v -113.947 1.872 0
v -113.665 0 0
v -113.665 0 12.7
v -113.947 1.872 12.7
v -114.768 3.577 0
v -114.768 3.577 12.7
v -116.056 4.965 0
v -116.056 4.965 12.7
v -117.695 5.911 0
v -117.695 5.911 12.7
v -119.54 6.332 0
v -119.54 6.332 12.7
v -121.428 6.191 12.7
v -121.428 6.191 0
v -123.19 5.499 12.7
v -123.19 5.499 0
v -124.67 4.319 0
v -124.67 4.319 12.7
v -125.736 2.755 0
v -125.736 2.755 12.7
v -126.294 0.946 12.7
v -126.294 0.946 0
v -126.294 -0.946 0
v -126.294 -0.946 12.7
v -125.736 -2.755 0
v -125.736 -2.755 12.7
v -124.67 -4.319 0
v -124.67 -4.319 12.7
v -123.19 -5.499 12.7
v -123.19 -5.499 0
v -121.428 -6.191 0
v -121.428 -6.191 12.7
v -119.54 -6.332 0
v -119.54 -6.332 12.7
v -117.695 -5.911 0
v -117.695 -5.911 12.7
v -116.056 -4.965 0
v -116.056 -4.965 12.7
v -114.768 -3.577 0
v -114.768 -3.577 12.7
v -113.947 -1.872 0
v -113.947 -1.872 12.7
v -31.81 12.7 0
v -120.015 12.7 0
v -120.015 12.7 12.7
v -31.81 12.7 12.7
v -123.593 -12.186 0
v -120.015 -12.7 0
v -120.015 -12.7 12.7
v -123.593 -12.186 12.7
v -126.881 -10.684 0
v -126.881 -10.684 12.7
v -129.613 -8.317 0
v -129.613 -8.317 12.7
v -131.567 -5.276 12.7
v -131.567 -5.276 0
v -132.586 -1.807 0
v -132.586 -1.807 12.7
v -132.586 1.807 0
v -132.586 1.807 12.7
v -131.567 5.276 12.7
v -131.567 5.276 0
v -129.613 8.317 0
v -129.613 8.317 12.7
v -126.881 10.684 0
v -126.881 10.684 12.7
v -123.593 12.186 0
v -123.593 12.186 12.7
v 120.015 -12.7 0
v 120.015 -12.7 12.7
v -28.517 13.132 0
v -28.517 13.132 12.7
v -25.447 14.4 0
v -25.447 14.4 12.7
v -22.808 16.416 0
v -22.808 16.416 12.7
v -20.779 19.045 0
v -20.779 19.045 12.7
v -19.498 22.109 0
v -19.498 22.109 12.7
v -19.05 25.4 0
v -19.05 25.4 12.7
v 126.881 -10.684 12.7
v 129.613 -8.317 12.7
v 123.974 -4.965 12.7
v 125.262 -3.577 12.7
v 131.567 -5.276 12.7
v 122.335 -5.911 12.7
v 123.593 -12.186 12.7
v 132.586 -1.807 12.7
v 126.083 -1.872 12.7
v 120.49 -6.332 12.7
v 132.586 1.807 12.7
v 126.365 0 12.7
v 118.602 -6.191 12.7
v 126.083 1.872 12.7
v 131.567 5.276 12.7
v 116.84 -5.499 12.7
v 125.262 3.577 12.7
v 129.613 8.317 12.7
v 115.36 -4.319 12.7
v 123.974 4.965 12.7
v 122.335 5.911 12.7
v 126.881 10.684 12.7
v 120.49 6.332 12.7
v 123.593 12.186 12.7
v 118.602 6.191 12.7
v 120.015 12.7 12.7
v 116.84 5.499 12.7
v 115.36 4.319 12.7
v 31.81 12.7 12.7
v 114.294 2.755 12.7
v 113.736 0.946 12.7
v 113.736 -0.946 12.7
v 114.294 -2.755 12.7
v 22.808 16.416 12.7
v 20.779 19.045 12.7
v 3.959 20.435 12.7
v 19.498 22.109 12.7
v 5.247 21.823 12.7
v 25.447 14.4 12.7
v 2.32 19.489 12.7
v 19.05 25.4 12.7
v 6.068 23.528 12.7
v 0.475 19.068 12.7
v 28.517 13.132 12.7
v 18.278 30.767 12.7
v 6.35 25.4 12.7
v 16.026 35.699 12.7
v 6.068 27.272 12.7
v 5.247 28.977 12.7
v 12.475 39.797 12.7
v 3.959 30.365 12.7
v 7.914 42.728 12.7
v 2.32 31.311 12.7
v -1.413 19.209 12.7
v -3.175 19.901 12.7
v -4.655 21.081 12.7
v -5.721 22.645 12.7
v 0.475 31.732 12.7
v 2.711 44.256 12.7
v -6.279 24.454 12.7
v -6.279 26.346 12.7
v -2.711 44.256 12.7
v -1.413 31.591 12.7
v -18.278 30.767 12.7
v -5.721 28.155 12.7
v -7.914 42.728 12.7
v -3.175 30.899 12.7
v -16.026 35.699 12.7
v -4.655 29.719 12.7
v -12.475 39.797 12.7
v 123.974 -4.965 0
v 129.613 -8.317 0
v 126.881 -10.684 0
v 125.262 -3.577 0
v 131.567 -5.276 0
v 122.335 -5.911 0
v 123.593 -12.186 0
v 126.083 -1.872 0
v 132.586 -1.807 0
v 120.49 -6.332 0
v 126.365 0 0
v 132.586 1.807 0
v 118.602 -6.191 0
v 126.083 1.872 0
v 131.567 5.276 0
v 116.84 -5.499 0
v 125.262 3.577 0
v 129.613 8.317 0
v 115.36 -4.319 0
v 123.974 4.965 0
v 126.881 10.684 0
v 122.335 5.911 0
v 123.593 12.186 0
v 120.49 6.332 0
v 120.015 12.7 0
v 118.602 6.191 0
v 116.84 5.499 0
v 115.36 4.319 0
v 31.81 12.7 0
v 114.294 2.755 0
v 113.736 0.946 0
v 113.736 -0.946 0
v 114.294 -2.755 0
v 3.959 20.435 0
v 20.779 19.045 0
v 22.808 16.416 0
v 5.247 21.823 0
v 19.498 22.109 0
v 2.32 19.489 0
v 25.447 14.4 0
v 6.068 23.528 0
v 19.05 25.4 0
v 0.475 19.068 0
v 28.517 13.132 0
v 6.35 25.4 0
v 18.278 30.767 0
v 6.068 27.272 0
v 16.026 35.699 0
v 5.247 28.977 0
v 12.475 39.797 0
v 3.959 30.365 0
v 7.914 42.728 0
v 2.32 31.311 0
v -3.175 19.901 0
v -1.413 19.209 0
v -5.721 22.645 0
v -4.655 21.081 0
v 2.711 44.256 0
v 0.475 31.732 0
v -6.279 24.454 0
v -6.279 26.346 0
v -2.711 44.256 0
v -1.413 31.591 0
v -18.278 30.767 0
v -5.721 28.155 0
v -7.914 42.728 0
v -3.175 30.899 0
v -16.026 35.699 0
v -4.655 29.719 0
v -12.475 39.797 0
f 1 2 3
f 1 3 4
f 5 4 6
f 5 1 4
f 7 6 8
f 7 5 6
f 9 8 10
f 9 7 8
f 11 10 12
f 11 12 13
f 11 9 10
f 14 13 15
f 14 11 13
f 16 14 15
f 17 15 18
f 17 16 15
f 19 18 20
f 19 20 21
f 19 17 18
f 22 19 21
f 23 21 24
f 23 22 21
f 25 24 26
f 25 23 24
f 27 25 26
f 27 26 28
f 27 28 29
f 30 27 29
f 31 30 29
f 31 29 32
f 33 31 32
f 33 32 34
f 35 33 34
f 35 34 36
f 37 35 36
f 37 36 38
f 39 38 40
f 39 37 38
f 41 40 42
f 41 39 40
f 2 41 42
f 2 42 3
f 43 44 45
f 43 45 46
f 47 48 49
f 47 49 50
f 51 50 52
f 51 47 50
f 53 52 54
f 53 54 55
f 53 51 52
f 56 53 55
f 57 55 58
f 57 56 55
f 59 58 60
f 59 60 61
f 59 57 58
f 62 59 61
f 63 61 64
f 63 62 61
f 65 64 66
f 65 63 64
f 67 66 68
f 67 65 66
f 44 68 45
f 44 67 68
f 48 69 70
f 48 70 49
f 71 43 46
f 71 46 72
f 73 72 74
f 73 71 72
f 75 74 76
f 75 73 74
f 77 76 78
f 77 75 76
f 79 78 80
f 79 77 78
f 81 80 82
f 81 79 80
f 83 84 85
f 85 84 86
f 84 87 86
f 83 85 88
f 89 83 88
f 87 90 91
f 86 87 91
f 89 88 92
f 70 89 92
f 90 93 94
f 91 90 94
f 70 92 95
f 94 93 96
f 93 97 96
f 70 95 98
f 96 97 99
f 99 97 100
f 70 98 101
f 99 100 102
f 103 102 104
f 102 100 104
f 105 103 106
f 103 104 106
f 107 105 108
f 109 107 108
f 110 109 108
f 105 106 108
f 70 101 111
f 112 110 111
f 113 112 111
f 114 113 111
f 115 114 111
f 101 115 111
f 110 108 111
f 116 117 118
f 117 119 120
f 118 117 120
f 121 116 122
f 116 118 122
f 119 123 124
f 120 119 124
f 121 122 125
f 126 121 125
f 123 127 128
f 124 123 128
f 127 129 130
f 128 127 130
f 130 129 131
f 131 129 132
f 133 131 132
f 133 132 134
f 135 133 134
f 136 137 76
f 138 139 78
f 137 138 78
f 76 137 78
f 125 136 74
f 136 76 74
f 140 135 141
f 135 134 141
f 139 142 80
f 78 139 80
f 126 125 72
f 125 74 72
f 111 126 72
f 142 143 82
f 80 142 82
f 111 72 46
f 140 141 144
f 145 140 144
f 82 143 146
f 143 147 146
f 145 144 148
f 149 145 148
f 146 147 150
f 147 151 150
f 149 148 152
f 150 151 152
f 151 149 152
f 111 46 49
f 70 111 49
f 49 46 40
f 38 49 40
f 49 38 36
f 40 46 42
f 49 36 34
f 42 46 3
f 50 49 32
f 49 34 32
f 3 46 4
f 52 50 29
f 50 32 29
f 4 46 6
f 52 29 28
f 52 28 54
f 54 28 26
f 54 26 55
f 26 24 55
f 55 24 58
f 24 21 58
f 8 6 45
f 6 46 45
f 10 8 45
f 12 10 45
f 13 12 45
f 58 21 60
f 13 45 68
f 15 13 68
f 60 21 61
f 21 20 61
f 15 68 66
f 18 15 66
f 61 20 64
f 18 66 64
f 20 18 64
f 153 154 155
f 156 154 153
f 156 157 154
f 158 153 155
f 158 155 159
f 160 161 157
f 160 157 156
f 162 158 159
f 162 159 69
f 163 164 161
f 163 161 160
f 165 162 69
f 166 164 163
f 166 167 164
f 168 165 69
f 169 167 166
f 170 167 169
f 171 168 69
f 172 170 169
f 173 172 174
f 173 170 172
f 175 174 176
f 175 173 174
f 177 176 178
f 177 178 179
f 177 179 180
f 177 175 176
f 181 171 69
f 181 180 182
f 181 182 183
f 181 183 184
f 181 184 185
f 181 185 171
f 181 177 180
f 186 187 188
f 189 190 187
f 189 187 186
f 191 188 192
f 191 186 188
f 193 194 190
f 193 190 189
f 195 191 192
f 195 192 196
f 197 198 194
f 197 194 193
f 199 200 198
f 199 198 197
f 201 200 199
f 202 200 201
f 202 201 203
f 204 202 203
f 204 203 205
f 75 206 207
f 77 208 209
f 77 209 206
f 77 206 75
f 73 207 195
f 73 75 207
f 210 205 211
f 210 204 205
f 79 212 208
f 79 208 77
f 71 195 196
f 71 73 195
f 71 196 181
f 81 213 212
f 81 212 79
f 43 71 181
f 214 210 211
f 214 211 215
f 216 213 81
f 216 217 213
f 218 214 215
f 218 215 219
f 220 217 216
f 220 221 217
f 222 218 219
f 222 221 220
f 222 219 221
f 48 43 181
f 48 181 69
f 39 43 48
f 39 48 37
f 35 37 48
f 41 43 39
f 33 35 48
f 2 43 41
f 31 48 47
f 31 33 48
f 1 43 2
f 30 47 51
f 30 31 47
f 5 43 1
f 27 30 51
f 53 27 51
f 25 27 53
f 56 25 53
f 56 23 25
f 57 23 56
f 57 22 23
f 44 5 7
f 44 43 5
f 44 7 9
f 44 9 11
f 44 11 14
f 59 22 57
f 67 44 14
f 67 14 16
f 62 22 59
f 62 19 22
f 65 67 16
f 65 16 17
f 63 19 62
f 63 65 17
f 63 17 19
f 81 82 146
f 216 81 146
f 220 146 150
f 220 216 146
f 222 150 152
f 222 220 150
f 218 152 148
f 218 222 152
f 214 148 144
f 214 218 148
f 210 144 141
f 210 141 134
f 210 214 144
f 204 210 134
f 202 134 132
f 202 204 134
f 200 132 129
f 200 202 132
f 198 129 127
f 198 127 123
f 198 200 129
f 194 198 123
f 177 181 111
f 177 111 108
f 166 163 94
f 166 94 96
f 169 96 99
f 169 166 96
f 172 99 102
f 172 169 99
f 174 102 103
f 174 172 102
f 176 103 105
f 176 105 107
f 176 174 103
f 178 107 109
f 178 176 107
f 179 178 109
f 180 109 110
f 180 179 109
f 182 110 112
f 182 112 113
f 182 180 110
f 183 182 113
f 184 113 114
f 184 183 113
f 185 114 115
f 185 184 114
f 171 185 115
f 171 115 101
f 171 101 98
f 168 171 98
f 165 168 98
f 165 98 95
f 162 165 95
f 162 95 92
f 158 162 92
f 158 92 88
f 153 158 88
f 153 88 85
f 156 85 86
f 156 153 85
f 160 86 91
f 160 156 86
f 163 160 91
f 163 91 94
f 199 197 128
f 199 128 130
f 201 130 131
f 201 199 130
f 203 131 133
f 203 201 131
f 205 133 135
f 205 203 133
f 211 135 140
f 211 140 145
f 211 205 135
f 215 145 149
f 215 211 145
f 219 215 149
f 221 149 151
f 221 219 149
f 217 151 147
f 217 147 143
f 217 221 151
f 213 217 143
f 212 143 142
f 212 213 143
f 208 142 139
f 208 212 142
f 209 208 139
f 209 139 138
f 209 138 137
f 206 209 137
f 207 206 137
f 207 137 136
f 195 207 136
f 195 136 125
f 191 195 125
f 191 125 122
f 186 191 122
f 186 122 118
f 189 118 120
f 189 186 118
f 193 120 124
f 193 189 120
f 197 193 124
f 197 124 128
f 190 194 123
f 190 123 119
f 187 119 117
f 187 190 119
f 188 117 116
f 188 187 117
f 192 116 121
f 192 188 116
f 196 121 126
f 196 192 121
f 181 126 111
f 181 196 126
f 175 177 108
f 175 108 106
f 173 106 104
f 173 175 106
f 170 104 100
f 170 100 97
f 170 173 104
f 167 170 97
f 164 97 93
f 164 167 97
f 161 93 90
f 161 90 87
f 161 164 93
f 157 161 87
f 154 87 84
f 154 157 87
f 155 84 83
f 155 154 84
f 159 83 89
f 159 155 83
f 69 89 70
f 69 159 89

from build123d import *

# Parameters (mm, degrees)
SKETCH1_R           = 6.35
BOSS_EXTRUDE1_DEPTH = 12.7


with BuildPart() as part:
    # Sketch1 → Boss-Extrude1 (new body)
    with BuildSketch(Plane.XY):
        with BuildLine():
            Line((-120.015, 12.7), (-31.809733165, 12.7))
            ThreePointArc((-31.809733165, 12.7), (-22.808332465, 16.416135762), (-19.05, 25.4))
            ThreePointArc((-19.05, 25.4), (0, 44.45), (19.05, 25.4))
            ThreePointArc((19.05, 25.4), (22.808332465, 16.416135762), (31.809733165, 12.7))
            Line((31.809733165, 12.7), (120.015, 12.7))
            ThreePointArc((120.015, 12.7), (132.715, 0), (120.015, -12.7))
            Line((120.015, -12.7), (-120.015, -12.7))
            ThreePointArc((-120.015, -12.7), (-132.715, 0), (-120.015, 12.7))
        make_face()
        with Locations((-120.015, 0)):
            Circle(SKETCH1_R, mode=Mode.SUBTRACT)
        with Locations((120.015, 0)):
            Circle(SKETCH1_R, mode=Mode.SUBTRACT)
        with Locations((0, 25.4)):
            Circle(SKETCH1_R, mode=Mode.SUBTRACT)
    extrude(amount=BOSS_EXTRUDE1_DEPTH)


solid = part.part
